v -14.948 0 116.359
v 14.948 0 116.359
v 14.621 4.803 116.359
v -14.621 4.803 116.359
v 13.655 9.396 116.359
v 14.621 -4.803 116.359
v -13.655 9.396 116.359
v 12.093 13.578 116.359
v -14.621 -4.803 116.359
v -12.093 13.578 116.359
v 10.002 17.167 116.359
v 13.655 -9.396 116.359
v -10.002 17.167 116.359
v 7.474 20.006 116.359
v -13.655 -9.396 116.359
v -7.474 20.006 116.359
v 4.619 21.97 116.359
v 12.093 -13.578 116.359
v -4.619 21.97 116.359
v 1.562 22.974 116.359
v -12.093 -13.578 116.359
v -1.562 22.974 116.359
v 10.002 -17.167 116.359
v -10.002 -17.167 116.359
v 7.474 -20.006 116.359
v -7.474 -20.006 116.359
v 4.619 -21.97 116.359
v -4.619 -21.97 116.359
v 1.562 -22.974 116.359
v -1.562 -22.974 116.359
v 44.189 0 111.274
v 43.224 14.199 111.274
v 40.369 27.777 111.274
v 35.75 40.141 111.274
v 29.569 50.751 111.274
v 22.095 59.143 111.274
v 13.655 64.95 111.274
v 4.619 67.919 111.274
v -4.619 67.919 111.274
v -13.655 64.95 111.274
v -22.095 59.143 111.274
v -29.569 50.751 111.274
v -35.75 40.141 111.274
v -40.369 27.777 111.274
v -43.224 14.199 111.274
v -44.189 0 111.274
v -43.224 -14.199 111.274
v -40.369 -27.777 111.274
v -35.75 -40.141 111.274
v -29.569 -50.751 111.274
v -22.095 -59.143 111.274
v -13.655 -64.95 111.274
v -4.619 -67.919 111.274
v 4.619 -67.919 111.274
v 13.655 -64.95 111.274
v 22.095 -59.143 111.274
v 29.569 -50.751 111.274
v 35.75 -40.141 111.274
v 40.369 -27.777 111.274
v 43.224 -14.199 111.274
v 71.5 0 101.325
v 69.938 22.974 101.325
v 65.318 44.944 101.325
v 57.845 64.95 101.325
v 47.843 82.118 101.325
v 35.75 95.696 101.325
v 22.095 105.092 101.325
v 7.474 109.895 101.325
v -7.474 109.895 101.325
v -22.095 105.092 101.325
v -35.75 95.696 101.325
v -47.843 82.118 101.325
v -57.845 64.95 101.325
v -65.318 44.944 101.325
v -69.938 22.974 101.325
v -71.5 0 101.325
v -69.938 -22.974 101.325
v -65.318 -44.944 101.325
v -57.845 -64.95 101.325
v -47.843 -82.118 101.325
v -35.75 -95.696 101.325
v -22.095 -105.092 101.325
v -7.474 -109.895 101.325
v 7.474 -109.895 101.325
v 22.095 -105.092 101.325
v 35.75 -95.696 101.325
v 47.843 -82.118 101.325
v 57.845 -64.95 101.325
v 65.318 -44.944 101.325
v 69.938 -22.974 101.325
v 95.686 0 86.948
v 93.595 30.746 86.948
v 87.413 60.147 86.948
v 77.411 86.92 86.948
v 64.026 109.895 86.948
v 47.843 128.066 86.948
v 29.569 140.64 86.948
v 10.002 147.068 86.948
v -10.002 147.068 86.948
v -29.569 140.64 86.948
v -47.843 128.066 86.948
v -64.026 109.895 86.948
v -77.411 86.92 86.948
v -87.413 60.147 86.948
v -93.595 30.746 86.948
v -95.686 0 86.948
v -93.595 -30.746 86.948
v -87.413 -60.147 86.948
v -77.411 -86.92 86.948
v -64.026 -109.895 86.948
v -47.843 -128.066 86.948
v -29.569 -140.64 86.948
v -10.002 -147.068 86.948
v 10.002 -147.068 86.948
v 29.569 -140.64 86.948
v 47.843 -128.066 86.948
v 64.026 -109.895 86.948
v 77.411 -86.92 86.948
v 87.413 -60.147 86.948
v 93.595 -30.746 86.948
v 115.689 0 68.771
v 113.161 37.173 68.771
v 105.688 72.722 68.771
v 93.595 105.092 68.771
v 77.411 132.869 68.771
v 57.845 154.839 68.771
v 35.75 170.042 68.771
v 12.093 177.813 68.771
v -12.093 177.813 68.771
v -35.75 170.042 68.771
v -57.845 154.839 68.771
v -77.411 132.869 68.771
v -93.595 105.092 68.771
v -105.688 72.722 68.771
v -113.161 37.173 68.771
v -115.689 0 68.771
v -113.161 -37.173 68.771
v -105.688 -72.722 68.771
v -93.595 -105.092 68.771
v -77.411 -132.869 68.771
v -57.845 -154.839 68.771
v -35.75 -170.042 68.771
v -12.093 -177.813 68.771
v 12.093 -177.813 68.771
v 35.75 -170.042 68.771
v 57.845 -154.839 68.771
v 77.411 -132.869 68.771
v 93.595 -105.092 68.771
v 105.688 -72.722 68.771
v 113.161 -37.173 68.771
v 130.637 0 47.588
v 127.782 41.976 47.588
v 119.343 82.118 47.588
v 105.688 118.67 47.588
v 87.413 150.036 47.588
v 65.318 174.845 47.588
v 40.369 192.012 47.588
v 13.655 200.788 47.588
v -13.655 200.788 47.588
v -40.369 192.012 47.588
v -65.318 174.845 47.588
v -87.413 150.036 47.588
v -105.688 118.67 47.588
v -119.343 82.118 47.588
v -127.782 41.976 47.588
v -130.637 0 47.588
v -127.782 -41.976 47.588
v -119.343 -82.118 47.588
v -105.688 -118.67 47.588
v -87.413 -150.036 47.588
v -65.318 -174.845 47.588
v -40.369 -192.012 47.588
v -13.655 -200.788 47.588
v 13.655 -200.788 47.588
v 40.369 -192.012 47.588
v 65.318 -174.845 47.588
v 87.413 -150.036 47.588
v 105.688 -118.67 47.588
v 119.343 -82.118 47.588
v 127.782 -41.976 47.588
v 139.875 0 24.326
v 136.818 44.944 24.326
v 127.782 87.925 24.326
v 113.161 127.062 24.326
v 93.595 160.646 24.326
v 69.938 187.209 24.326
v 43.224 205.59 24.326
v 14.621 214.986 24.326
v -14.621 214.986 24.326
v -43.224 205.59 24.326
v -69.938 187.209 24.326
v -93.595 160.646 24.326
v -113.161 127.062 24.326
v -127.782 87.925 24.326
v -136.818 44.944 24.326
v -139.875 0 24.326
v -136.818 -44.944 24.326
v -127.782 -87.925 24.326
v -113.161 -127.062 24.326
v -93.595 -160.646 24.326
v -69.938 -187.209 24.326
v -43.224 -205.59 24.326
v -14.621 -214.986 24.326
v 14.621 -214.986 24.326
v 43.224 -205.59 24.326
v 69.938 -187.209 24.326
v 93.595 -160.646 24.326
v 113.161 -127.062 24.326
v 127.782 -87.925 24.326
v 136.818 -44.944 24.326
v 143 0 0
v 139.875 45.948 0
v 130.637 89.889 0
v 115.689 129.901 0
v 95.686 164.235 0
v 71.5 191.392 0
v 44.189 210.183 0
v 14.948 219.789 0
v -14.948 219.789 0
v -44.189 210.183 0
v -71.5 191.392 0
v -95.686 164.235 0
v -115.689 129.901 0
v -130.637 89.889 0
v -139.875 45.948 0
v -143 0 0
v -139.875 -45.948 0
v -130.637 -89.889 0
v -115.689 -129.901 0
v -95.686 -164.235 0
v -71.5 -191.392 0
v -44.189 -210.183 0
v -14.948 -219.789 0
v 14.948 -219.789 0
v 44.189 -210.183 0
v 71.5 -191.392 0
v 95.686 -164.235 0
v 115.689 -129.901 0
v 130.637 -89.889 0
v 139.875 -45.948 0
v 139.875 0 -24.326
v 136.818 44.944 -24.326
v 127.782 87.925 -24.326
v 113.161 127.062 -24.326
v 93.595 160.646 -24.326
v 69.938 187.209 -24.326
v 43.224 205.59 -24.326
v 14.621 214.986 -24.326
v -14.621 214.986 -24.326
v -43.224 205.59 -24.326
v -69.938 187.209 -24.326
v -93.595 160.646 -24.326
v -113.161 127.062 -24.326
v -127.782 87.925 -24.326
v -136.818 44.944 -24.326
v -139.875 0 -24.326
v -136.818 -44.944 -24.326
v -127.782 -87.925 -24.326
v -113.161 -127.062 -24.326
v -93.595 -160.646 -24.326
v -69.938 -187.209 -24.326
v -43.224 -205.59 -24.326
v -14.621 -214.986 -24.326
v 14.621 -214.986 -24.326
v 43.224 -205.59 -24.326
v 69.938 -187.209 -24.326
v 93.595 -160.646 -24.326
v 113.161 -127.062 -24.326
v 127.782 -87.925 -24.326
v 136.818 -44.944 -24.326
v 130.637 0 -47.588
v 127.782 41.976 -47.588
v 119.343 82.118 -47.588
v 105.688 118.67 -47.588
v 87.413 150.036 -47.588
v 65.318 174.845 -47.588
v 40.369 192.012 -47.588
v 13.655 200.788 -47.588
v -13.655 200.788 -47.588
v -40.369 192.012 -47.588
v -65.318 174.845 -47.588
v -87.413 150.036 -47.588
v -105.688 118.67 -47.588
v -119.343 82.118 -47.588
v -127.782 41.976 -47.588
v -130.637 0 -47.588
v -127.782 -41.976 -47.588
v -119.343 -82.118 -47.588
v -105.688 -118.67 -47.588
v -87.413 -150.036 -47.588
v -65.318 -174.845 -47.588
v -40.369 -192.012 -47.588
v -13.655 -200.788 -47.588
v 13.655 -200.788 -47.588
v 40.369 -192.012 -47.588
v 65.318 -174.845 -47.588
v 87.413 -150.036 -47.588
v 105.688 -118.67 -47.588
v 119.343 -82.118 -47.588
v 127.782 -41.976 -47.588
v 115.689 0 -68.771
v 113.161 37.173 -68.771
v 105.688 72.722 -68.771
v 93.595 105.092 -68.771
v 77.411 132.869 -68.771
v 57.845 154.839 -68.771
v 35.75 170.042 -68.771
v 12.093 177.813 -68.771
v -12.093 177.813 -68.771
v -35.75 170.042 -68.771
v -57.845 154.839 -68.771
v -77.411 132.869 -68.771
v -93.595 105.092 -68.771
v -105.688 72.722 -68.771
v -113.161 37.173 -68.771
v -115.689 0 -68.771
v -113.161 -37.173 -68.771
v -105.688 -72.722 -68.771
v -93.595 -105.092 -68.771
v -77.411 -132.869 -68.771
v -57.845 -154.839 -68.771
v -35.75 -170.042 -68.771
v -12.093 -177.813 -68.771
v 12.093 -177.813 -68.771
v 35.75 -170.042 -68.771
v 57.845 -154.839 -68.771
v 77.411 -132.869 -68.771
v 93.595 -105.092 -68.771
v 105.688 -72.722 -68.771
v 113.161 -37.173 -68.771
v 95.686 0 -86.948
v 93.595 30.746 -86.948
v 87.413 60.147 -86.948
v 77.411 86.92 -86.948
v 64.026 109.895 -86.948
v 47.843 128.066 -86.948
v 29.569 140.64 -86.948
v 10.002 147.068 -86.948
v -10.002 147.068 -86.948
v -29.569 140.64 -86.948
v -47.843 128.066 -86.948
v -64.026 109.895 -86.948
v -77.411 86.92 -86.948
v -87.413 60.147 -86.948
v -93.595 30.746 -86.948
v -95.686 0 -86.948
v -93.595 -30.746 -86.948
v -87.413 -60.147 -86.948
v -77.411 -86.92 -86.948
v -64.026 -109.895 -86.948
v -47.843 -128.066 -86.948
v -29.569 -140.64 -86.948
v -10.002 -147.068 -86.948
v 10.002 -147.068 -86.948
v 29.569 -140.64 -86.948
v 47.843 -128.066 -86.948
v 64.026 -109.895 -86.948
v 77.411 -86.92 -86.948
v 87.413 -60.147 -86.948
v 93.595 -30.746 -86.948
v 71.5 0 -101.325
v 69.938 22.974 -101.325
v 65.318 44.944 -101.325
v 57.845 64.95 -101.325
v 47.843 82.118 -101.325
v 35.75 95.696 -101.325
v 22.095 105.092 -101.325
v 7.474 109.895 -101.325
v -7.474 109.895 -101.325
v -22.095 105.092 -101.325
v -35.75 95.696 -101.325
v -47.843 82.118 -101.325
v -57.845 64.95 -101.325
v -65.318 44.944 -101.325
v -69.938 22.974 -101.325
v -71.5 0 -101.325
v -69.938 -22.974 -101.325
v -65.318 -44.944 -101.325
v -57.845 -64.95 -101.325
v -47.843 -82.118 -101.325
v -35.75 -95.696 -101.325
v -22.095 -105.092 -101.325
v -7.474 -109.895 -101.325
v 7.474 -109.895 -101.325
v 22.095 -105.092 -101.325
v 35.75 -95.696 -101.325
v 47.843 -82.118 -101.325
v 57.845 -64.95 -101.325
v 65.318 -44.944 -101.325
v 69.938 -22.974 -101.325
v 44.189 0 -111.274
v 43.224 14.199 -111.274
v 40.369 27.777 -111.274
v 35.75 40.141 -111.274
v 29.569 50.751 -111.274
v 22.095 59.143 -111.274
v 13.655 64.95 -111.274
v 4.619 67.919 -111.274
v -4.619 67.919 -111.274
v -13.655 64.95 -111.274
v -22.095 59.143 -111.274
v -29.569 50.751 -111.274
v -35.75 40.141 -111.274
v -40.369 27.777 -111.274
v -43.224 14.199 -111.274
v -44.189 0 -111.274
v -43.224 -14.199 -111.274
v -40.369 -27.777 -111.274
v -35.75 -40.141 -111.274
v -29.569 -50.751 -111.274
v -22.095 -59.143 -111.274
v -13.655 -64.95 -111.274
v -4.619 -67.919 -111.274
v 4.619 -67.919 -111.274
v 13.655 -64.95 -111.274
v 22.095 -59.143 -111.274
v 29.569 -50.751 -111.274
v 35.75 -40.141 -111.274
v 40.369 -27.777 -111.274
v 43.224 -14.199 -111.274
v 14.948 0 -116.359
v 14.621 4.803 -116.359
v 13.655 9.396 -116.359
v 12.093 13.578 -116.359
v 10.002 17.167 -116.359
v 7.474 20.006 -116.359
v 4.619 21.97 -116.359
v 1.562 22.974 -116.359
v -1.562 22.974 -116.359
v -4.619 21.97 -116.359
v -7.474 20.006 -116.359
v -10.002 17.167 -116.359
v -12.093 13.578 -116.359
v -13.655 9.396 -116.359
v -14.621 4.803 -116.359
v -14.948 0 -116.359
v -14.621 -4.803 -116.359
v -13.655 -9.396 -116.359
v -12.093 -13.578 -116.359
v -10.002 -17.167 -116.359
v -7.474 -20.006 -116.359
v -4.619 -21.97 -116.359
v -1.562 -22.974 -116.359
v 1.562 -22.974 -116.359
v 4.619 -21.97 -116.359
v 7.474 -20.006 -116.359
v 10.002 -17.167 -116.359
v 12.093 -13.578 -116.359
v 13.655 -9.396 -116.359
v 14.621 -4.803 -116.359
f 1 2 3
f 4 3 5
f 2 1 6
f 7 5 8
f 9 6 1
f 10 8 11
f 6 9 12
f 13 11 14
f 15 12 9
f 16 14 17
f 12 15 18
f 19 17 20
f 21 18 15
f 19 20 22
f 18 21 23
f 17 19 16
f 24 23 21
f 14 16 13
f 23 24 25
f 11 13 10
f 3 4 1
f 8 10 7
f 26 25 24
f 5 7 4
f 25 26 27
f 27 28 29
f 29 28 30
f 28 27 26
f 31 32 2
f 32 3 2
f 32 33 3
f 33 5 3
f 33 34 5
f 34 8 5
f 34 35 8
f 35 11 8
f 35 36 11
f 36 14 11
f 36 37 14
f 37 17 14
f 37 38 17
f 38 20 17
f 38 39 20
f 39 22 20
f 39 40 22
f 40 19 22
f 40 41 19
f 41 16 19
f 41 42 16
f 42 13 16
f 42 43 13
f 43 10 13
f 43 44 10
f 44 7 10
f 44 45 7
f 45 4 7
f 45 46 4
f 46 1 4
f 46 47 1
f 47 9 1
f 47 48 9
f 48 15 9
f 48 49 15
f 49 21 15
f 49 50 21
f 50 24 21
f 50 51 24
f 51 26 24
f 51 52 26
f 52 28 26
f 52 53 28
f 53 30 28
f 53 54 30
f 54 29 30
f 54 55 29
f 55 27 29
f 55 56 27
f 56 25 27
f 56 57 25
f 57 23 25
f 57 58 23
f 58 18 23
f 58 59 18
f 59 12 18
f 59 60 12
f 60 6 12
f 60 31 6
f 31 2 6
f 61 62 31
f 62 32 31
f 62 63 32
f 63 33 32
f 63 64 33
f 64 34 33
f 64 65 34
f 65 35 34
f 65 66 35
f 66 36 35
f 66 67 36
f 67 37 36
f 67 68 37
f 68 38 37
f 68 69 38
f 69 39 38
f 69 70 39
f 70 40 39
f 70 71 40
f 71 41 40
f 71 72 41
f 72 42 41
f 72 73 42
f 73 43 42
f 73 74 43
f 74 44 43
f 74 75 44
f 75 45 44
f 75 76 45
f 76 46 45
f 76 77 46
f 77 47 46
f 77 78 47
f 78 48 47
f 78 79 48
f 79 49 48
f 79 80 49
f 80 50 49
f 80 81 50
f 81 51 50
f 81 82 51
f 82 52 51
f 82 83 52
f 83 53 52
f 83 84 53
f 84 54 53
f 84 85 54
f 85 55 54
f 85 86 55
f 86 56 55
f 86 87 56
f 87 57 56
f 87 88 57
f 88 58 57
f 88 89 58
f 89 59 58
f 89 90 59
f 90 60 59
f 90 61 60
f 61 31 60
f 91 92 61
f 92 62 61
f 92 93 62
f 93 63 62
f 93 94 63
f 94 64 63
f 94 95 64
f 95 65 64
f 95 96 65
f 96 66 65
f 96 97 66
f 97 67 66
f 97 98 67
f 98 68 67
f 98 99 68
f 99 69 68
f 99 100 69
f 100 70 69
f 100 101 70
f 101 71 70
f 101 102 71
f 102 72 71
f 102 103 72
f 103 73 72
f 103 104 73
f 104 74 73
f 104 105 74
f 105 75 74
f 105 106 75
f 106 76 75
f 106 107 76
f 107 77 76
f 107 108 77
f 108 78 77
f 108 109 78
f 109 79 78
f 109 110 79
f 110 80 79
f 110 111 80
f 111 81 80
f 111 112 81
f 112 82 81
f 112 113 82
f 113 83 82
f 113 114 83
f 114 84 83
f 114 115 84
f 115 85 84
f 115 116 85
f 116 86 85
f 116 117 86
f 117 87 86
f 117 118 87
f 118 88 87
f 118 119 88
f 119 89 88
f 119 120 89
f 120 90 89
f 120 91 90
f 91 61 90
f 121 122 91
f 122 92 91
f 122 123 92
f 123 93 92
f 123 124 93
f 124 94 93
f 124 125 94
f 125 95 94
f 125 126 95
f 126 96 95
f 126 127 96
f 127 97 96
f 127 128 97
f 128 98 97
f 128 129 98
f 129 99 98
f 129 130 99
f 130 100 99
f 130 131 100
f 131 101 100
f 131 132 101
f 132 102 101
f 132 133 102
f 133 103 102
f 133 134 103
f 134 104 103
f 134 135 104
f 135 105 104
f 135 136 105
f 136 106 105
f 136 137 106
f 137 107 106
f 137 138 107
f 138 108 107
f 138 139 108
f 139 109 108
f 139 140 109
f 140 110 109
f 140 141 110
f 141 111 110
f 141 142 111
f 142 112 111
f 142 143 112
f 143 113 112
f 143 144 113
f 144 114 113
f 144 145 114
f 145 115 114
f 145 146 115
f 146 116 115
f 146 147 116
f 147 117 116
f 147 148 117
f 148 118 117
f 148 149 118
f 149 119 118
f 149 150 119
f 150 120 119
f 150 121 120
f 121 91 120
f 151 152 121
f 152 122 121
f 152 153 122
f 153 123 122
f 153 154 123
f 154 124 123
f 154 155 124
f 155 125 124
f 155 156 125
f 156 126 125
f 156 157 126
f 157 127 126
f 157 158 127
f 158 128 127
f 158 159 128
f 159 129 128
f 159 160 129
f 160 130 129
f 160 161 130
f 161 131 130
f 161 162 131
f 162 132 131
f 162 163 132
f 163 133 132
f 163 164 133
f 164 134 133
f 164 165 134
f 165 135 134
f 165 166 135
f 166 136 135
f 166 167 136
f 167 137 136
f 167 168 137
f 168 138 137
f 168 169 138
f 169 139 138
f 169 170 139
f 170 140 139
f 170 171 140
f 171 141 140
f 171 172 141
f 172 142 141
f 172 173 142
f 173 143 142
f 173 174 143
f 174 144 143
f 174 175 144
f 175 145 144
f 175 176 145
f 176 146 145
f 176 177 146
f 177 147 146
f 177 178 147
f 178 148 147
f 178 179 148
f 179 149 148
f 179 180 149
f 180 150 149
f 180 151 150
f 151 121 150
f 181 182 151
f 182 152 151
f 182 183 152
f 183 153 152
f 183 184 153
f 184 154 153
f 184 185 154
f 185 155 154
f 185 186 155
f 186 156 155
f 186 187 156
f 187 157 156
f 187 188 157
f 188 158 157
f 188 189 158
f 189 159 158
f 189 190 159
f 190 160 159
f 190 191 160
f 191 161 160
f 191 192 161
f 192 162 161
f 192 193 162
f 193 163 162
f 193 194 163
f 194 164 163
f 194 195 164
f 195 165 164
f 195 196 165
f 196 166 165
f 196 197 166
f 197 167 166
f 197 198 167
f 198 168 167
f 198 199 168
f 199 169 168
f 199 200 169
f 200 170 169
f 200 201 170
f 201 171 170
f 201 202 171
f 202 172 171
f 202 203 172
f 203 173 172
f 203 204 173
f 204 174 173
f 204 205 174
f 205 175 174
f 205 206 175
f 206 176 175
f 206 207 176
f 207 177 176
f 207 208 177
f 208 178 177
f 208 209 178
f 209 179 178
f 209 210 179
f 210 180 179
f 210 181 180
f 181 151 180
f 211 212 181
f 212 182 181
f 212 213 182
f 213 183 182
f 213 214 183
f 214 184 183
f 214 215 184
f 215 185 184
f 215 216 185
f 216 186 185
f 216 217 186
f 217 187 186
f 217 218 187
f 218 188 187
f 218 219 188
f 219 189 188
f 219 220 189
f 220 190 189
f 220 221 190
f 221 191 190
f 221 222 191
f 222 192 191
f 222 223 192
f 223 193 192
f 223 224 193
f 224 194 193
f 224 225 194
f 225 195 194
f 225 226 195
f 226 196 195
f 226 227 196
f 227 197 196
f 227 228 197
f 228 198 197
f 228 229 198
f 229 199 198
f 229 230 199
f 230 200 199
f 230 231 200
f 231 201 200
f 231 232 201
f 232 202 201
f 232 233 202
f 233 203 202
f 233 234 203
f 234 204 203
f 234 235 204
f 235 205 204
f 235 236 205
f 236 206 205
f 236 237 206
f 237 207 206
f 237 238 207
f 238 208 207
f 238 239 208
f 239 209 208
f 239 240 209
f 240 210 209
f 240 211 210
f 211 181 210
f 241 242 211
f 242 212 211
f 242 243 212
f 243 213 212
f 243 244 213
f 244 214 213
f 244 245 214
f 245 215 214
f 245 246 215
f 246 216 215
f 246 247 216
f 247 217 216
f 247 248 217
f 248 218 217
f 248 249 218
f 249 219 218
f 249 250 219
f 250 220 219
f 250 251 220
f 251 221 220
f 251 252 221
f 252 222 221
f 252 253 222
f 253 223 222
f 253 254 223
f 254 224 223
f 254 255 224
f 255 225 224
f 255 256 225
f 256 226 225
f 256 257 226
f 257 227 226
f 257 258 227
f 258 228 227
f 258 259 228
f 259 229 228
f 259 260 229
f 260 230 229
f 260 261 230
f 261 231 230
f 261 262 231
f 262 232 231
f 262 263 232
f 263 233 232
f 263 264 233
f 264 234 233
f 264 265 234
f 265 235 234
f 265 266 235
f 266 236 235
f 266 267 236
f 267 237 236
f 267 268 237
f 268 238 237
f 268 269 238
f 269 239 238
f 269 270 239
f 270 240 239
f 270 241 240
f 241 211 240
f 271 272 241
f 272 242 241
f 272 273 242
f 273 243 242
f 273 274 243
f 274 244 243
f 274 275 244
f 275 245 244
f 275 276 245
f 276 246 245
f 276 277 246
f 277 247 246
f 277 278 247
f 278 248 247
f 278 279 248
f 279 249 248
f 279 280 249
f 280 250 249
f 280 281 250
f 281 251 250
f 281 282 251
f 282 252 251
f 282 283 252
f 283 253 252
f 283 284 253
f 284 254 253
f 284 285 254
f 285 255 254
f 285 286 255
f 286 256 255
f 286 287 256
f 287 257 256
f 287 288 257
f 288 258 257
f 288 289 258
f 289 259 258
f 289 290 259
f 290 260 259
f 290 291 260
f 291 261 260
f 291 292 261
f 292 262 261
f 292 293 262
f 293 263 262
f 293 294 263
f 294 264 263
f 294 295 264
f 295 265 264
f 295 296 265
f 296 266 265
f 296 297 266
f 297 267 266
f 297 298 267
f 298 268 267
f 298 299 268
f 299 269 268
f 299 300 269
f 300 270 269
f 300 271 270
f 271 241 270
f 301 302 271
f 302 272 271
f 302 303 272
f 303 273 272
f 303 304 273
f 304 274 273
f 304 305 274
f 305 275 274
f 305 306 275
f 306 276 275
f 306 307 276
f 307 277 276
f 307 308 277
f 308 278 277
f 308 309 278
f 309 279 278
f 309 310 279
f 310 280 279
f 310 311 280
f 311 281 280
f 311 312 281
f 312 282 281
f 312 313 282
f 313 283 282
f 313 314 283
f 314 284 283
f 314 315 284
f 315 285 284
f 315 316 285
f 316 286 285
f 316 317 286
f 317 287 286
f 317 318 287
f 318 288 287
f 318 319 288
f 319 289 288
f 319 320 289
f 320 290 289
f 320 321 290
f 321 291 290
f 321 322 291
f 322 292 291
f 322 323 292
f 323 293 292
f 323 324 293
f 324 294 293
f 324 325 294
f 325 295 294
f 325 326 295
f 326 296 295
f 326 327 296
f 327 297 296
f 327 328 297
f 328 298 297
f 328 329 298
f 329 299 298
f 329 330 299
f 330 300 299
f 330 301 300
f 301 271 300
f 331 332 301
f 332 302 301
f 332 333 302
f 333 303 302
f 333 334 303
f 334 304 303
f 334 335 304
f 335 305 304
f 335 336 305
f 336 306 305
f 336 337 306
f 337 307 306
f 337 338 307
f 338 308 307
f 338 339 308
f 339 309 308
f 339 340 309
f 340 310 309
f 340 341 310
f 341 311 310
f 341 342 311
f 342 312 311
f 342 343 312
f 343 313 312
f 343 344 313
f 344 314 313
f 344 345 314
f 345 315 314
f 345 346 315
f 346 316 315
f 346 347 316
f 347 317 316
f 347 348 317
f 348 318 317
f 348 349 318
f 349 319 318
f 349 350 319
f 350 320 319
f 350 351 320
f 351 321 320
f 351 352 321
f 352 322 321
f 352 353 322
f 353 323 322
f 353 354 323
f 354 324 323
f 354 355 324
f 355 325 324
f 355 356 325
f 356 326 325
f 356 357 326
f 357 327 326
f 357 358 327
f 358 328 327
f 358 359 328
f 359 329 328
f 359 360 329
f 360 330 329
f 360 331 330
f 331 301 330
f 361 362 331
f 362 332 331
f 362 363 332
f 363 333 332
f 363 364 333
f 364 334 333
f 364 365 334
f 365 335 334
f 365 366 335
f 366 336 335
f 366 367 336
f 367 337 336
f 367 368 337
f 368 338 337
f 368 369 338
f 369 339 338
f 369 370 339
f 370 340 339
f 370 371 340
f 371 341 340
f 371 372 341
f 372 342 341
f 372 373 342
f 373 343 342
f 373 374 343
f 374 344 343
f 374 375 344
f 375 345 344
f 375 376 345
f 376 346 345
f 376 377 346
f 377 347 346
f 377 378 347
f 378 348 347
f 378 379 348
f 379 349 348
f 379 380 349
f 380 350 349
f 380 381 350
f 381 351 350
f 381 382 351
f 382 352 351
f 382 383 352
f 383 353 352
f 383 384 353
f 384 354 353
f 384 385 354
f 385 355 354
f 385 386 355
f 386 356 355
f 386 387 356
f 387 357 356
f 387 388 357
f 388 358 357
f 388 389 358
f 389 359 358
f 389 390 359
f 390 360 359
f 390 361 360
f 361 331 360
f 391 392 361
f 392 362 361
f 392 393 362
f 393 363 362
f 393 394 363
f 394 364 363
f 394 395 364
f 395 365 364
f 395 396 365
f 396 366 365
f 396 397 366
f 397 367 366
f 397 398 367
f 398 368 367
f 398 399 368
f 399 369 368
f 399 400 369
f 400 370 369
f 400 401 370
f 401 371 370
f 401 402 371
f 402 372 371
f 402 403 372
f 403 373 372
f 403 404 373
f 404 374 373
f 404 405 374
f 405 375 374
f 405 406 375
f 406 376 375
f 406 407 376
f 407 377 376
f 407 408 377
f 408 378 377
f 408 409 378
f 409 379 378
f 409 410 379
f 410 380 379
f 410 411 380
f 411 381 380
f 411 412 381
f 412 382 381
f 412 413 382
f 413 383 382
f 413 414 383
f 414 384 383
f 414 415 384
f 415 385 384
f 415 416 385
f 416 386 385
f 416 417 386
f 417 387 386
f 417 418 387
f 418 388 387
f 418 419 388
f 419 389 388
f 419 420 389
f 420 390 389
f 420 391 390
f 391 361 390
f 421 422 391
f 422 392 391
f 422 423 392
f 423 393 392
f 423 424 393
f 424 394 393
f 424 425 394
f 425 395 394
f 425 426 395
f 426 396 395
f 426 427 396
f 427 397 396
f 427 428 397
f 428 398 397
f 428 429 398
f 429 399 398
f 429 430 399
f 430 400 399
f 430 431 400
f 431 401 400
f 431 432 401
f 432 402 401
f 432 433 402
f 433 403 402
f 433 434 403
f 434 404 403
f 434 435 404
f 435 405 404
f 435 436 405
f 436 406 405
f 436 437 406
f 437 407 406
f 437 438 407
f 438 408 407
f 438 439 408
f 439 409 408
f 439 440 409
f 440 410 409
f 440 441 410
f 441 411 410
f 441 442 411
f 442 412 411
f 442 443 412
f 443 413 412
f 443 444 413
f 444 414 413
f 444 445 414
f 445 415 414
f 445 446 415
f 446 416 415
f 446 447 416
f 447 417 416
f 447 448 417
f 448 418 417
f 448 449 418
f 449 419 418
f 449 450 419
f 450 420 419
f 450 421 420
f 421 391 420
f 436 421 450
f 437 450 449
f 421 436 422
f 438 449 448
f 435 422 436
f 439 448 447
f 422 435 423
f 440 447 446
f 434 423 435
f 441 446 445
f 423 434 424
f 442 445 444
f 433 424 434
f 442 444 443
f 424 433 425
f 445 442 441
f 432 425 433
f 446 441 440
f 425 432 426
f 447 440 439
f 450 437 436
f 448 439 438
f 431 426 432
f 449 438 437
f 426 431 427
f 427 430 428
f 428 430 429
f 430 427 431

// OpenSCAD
// Generated by SolidPython 1.0.1 on 2020-07-29 00:46:50


scale(v = [11, 17, 9]) {
	sphere(r = 13);
}
/***********************************************
*********      SolidPython code:      **********
************************************************
 
# import packages: SolidPython
from solid import *
from solid.utils import *
from itertools import chain, combinations, permutations


class Resize:

    def __init__(self, scad_file):
        self.scad_file = scad_file
        #self.scad_file = import_scad(scad_file)
        # cone/cylinder param:
        self.r1 = 0
        self.r2 = 0
        self.h = 0
        # rectangular prism param:
        self.w = 0
        self.l = 0
        # ellipse param:
        self.r = 0

    # import OpenScad code (file name corresponds to shape)


    # classify shape + parameters
    def assign(self, param1, param2, param3):
        if self.scad_file == 'cone.scad':
            self.r1 = param1
            self.r2 = param2
            self.h = param3
        elif self.scad_file == 'cylinder.scad':
            self.r1 = param1
            self.r2 = param2
            self.h = param3
        elif self.scad_file == 'rectangularPrism.scad':
            self.h = param1
            self.l = param2
            self.w = param3
        else:
            self.r = param1
            self.h = param2

    # resize parameters
    def iterate(self):
        x = range(3, 20, 2)
        i = 1
        if self.scad_file == 'cone.scad':
            tempList = list(permutations(x, 2))
            for temp in tempList:
                param1 = temp[0]
                param2 = temp[1]
                filepath = 'produced_scad_files/' + 'cone' + str(param1) + '_' + str(param2) + '_' + '.scad'
                scad_render_to_file(cylinder(h=param1, r1=param2, r2=0), filepath)

        elif self.scad_file == 'cylinder.scad':
            tempList = list(permutations(x, 3))
            for temp in tempList:
                param1 = temp[0]
                param2 = temp[1]
                filepath = 'produced_scad_files/' + 'cylinder' + str(param1) + '_' + str(param2) + '_' + '.scad'
                scad_render_to_file(cylinder(h=param1, r1=param2, r2=param2), filepath)

        elif self.scad_file == 'rectangularPrism.scad':
            tempList = list(permutations(x, 3))
            for temp in tempList:
                param1 = temp[0]
                param2 = temp[1]
                param3 = temp[2]
                filepath = 'produced_scad_files/' + 'rectangularPrism' + str(param1) + '_' + str(param2) + '_' + str(
                    param3) + '.scad'
                scad_render_to_file(cube(size=(param1, param2, param3)), filepath)

        elif self.scad_file == 'ellipse.scad':
            tempList = list(permutations(x, 4))
            for temp in tempList:
                param1 = temp[0]
                param2 = temp[1]
                param3 = temp[2]
                param4 = temp[3]
                filepath = 'produced_scad_files/' + 'ellipse' + str(param1) + '_' + str(param2) + '_' + str(param3) + '_' + str(param4) + '.scad'
                scad_render_to_file(scale([param1, param2, param3])(sphere(r=param4)), filepath)

    def render_to_scadfile(self):
        scad_render_to_file(scad, 'example.scad') 
 
************************************************/
